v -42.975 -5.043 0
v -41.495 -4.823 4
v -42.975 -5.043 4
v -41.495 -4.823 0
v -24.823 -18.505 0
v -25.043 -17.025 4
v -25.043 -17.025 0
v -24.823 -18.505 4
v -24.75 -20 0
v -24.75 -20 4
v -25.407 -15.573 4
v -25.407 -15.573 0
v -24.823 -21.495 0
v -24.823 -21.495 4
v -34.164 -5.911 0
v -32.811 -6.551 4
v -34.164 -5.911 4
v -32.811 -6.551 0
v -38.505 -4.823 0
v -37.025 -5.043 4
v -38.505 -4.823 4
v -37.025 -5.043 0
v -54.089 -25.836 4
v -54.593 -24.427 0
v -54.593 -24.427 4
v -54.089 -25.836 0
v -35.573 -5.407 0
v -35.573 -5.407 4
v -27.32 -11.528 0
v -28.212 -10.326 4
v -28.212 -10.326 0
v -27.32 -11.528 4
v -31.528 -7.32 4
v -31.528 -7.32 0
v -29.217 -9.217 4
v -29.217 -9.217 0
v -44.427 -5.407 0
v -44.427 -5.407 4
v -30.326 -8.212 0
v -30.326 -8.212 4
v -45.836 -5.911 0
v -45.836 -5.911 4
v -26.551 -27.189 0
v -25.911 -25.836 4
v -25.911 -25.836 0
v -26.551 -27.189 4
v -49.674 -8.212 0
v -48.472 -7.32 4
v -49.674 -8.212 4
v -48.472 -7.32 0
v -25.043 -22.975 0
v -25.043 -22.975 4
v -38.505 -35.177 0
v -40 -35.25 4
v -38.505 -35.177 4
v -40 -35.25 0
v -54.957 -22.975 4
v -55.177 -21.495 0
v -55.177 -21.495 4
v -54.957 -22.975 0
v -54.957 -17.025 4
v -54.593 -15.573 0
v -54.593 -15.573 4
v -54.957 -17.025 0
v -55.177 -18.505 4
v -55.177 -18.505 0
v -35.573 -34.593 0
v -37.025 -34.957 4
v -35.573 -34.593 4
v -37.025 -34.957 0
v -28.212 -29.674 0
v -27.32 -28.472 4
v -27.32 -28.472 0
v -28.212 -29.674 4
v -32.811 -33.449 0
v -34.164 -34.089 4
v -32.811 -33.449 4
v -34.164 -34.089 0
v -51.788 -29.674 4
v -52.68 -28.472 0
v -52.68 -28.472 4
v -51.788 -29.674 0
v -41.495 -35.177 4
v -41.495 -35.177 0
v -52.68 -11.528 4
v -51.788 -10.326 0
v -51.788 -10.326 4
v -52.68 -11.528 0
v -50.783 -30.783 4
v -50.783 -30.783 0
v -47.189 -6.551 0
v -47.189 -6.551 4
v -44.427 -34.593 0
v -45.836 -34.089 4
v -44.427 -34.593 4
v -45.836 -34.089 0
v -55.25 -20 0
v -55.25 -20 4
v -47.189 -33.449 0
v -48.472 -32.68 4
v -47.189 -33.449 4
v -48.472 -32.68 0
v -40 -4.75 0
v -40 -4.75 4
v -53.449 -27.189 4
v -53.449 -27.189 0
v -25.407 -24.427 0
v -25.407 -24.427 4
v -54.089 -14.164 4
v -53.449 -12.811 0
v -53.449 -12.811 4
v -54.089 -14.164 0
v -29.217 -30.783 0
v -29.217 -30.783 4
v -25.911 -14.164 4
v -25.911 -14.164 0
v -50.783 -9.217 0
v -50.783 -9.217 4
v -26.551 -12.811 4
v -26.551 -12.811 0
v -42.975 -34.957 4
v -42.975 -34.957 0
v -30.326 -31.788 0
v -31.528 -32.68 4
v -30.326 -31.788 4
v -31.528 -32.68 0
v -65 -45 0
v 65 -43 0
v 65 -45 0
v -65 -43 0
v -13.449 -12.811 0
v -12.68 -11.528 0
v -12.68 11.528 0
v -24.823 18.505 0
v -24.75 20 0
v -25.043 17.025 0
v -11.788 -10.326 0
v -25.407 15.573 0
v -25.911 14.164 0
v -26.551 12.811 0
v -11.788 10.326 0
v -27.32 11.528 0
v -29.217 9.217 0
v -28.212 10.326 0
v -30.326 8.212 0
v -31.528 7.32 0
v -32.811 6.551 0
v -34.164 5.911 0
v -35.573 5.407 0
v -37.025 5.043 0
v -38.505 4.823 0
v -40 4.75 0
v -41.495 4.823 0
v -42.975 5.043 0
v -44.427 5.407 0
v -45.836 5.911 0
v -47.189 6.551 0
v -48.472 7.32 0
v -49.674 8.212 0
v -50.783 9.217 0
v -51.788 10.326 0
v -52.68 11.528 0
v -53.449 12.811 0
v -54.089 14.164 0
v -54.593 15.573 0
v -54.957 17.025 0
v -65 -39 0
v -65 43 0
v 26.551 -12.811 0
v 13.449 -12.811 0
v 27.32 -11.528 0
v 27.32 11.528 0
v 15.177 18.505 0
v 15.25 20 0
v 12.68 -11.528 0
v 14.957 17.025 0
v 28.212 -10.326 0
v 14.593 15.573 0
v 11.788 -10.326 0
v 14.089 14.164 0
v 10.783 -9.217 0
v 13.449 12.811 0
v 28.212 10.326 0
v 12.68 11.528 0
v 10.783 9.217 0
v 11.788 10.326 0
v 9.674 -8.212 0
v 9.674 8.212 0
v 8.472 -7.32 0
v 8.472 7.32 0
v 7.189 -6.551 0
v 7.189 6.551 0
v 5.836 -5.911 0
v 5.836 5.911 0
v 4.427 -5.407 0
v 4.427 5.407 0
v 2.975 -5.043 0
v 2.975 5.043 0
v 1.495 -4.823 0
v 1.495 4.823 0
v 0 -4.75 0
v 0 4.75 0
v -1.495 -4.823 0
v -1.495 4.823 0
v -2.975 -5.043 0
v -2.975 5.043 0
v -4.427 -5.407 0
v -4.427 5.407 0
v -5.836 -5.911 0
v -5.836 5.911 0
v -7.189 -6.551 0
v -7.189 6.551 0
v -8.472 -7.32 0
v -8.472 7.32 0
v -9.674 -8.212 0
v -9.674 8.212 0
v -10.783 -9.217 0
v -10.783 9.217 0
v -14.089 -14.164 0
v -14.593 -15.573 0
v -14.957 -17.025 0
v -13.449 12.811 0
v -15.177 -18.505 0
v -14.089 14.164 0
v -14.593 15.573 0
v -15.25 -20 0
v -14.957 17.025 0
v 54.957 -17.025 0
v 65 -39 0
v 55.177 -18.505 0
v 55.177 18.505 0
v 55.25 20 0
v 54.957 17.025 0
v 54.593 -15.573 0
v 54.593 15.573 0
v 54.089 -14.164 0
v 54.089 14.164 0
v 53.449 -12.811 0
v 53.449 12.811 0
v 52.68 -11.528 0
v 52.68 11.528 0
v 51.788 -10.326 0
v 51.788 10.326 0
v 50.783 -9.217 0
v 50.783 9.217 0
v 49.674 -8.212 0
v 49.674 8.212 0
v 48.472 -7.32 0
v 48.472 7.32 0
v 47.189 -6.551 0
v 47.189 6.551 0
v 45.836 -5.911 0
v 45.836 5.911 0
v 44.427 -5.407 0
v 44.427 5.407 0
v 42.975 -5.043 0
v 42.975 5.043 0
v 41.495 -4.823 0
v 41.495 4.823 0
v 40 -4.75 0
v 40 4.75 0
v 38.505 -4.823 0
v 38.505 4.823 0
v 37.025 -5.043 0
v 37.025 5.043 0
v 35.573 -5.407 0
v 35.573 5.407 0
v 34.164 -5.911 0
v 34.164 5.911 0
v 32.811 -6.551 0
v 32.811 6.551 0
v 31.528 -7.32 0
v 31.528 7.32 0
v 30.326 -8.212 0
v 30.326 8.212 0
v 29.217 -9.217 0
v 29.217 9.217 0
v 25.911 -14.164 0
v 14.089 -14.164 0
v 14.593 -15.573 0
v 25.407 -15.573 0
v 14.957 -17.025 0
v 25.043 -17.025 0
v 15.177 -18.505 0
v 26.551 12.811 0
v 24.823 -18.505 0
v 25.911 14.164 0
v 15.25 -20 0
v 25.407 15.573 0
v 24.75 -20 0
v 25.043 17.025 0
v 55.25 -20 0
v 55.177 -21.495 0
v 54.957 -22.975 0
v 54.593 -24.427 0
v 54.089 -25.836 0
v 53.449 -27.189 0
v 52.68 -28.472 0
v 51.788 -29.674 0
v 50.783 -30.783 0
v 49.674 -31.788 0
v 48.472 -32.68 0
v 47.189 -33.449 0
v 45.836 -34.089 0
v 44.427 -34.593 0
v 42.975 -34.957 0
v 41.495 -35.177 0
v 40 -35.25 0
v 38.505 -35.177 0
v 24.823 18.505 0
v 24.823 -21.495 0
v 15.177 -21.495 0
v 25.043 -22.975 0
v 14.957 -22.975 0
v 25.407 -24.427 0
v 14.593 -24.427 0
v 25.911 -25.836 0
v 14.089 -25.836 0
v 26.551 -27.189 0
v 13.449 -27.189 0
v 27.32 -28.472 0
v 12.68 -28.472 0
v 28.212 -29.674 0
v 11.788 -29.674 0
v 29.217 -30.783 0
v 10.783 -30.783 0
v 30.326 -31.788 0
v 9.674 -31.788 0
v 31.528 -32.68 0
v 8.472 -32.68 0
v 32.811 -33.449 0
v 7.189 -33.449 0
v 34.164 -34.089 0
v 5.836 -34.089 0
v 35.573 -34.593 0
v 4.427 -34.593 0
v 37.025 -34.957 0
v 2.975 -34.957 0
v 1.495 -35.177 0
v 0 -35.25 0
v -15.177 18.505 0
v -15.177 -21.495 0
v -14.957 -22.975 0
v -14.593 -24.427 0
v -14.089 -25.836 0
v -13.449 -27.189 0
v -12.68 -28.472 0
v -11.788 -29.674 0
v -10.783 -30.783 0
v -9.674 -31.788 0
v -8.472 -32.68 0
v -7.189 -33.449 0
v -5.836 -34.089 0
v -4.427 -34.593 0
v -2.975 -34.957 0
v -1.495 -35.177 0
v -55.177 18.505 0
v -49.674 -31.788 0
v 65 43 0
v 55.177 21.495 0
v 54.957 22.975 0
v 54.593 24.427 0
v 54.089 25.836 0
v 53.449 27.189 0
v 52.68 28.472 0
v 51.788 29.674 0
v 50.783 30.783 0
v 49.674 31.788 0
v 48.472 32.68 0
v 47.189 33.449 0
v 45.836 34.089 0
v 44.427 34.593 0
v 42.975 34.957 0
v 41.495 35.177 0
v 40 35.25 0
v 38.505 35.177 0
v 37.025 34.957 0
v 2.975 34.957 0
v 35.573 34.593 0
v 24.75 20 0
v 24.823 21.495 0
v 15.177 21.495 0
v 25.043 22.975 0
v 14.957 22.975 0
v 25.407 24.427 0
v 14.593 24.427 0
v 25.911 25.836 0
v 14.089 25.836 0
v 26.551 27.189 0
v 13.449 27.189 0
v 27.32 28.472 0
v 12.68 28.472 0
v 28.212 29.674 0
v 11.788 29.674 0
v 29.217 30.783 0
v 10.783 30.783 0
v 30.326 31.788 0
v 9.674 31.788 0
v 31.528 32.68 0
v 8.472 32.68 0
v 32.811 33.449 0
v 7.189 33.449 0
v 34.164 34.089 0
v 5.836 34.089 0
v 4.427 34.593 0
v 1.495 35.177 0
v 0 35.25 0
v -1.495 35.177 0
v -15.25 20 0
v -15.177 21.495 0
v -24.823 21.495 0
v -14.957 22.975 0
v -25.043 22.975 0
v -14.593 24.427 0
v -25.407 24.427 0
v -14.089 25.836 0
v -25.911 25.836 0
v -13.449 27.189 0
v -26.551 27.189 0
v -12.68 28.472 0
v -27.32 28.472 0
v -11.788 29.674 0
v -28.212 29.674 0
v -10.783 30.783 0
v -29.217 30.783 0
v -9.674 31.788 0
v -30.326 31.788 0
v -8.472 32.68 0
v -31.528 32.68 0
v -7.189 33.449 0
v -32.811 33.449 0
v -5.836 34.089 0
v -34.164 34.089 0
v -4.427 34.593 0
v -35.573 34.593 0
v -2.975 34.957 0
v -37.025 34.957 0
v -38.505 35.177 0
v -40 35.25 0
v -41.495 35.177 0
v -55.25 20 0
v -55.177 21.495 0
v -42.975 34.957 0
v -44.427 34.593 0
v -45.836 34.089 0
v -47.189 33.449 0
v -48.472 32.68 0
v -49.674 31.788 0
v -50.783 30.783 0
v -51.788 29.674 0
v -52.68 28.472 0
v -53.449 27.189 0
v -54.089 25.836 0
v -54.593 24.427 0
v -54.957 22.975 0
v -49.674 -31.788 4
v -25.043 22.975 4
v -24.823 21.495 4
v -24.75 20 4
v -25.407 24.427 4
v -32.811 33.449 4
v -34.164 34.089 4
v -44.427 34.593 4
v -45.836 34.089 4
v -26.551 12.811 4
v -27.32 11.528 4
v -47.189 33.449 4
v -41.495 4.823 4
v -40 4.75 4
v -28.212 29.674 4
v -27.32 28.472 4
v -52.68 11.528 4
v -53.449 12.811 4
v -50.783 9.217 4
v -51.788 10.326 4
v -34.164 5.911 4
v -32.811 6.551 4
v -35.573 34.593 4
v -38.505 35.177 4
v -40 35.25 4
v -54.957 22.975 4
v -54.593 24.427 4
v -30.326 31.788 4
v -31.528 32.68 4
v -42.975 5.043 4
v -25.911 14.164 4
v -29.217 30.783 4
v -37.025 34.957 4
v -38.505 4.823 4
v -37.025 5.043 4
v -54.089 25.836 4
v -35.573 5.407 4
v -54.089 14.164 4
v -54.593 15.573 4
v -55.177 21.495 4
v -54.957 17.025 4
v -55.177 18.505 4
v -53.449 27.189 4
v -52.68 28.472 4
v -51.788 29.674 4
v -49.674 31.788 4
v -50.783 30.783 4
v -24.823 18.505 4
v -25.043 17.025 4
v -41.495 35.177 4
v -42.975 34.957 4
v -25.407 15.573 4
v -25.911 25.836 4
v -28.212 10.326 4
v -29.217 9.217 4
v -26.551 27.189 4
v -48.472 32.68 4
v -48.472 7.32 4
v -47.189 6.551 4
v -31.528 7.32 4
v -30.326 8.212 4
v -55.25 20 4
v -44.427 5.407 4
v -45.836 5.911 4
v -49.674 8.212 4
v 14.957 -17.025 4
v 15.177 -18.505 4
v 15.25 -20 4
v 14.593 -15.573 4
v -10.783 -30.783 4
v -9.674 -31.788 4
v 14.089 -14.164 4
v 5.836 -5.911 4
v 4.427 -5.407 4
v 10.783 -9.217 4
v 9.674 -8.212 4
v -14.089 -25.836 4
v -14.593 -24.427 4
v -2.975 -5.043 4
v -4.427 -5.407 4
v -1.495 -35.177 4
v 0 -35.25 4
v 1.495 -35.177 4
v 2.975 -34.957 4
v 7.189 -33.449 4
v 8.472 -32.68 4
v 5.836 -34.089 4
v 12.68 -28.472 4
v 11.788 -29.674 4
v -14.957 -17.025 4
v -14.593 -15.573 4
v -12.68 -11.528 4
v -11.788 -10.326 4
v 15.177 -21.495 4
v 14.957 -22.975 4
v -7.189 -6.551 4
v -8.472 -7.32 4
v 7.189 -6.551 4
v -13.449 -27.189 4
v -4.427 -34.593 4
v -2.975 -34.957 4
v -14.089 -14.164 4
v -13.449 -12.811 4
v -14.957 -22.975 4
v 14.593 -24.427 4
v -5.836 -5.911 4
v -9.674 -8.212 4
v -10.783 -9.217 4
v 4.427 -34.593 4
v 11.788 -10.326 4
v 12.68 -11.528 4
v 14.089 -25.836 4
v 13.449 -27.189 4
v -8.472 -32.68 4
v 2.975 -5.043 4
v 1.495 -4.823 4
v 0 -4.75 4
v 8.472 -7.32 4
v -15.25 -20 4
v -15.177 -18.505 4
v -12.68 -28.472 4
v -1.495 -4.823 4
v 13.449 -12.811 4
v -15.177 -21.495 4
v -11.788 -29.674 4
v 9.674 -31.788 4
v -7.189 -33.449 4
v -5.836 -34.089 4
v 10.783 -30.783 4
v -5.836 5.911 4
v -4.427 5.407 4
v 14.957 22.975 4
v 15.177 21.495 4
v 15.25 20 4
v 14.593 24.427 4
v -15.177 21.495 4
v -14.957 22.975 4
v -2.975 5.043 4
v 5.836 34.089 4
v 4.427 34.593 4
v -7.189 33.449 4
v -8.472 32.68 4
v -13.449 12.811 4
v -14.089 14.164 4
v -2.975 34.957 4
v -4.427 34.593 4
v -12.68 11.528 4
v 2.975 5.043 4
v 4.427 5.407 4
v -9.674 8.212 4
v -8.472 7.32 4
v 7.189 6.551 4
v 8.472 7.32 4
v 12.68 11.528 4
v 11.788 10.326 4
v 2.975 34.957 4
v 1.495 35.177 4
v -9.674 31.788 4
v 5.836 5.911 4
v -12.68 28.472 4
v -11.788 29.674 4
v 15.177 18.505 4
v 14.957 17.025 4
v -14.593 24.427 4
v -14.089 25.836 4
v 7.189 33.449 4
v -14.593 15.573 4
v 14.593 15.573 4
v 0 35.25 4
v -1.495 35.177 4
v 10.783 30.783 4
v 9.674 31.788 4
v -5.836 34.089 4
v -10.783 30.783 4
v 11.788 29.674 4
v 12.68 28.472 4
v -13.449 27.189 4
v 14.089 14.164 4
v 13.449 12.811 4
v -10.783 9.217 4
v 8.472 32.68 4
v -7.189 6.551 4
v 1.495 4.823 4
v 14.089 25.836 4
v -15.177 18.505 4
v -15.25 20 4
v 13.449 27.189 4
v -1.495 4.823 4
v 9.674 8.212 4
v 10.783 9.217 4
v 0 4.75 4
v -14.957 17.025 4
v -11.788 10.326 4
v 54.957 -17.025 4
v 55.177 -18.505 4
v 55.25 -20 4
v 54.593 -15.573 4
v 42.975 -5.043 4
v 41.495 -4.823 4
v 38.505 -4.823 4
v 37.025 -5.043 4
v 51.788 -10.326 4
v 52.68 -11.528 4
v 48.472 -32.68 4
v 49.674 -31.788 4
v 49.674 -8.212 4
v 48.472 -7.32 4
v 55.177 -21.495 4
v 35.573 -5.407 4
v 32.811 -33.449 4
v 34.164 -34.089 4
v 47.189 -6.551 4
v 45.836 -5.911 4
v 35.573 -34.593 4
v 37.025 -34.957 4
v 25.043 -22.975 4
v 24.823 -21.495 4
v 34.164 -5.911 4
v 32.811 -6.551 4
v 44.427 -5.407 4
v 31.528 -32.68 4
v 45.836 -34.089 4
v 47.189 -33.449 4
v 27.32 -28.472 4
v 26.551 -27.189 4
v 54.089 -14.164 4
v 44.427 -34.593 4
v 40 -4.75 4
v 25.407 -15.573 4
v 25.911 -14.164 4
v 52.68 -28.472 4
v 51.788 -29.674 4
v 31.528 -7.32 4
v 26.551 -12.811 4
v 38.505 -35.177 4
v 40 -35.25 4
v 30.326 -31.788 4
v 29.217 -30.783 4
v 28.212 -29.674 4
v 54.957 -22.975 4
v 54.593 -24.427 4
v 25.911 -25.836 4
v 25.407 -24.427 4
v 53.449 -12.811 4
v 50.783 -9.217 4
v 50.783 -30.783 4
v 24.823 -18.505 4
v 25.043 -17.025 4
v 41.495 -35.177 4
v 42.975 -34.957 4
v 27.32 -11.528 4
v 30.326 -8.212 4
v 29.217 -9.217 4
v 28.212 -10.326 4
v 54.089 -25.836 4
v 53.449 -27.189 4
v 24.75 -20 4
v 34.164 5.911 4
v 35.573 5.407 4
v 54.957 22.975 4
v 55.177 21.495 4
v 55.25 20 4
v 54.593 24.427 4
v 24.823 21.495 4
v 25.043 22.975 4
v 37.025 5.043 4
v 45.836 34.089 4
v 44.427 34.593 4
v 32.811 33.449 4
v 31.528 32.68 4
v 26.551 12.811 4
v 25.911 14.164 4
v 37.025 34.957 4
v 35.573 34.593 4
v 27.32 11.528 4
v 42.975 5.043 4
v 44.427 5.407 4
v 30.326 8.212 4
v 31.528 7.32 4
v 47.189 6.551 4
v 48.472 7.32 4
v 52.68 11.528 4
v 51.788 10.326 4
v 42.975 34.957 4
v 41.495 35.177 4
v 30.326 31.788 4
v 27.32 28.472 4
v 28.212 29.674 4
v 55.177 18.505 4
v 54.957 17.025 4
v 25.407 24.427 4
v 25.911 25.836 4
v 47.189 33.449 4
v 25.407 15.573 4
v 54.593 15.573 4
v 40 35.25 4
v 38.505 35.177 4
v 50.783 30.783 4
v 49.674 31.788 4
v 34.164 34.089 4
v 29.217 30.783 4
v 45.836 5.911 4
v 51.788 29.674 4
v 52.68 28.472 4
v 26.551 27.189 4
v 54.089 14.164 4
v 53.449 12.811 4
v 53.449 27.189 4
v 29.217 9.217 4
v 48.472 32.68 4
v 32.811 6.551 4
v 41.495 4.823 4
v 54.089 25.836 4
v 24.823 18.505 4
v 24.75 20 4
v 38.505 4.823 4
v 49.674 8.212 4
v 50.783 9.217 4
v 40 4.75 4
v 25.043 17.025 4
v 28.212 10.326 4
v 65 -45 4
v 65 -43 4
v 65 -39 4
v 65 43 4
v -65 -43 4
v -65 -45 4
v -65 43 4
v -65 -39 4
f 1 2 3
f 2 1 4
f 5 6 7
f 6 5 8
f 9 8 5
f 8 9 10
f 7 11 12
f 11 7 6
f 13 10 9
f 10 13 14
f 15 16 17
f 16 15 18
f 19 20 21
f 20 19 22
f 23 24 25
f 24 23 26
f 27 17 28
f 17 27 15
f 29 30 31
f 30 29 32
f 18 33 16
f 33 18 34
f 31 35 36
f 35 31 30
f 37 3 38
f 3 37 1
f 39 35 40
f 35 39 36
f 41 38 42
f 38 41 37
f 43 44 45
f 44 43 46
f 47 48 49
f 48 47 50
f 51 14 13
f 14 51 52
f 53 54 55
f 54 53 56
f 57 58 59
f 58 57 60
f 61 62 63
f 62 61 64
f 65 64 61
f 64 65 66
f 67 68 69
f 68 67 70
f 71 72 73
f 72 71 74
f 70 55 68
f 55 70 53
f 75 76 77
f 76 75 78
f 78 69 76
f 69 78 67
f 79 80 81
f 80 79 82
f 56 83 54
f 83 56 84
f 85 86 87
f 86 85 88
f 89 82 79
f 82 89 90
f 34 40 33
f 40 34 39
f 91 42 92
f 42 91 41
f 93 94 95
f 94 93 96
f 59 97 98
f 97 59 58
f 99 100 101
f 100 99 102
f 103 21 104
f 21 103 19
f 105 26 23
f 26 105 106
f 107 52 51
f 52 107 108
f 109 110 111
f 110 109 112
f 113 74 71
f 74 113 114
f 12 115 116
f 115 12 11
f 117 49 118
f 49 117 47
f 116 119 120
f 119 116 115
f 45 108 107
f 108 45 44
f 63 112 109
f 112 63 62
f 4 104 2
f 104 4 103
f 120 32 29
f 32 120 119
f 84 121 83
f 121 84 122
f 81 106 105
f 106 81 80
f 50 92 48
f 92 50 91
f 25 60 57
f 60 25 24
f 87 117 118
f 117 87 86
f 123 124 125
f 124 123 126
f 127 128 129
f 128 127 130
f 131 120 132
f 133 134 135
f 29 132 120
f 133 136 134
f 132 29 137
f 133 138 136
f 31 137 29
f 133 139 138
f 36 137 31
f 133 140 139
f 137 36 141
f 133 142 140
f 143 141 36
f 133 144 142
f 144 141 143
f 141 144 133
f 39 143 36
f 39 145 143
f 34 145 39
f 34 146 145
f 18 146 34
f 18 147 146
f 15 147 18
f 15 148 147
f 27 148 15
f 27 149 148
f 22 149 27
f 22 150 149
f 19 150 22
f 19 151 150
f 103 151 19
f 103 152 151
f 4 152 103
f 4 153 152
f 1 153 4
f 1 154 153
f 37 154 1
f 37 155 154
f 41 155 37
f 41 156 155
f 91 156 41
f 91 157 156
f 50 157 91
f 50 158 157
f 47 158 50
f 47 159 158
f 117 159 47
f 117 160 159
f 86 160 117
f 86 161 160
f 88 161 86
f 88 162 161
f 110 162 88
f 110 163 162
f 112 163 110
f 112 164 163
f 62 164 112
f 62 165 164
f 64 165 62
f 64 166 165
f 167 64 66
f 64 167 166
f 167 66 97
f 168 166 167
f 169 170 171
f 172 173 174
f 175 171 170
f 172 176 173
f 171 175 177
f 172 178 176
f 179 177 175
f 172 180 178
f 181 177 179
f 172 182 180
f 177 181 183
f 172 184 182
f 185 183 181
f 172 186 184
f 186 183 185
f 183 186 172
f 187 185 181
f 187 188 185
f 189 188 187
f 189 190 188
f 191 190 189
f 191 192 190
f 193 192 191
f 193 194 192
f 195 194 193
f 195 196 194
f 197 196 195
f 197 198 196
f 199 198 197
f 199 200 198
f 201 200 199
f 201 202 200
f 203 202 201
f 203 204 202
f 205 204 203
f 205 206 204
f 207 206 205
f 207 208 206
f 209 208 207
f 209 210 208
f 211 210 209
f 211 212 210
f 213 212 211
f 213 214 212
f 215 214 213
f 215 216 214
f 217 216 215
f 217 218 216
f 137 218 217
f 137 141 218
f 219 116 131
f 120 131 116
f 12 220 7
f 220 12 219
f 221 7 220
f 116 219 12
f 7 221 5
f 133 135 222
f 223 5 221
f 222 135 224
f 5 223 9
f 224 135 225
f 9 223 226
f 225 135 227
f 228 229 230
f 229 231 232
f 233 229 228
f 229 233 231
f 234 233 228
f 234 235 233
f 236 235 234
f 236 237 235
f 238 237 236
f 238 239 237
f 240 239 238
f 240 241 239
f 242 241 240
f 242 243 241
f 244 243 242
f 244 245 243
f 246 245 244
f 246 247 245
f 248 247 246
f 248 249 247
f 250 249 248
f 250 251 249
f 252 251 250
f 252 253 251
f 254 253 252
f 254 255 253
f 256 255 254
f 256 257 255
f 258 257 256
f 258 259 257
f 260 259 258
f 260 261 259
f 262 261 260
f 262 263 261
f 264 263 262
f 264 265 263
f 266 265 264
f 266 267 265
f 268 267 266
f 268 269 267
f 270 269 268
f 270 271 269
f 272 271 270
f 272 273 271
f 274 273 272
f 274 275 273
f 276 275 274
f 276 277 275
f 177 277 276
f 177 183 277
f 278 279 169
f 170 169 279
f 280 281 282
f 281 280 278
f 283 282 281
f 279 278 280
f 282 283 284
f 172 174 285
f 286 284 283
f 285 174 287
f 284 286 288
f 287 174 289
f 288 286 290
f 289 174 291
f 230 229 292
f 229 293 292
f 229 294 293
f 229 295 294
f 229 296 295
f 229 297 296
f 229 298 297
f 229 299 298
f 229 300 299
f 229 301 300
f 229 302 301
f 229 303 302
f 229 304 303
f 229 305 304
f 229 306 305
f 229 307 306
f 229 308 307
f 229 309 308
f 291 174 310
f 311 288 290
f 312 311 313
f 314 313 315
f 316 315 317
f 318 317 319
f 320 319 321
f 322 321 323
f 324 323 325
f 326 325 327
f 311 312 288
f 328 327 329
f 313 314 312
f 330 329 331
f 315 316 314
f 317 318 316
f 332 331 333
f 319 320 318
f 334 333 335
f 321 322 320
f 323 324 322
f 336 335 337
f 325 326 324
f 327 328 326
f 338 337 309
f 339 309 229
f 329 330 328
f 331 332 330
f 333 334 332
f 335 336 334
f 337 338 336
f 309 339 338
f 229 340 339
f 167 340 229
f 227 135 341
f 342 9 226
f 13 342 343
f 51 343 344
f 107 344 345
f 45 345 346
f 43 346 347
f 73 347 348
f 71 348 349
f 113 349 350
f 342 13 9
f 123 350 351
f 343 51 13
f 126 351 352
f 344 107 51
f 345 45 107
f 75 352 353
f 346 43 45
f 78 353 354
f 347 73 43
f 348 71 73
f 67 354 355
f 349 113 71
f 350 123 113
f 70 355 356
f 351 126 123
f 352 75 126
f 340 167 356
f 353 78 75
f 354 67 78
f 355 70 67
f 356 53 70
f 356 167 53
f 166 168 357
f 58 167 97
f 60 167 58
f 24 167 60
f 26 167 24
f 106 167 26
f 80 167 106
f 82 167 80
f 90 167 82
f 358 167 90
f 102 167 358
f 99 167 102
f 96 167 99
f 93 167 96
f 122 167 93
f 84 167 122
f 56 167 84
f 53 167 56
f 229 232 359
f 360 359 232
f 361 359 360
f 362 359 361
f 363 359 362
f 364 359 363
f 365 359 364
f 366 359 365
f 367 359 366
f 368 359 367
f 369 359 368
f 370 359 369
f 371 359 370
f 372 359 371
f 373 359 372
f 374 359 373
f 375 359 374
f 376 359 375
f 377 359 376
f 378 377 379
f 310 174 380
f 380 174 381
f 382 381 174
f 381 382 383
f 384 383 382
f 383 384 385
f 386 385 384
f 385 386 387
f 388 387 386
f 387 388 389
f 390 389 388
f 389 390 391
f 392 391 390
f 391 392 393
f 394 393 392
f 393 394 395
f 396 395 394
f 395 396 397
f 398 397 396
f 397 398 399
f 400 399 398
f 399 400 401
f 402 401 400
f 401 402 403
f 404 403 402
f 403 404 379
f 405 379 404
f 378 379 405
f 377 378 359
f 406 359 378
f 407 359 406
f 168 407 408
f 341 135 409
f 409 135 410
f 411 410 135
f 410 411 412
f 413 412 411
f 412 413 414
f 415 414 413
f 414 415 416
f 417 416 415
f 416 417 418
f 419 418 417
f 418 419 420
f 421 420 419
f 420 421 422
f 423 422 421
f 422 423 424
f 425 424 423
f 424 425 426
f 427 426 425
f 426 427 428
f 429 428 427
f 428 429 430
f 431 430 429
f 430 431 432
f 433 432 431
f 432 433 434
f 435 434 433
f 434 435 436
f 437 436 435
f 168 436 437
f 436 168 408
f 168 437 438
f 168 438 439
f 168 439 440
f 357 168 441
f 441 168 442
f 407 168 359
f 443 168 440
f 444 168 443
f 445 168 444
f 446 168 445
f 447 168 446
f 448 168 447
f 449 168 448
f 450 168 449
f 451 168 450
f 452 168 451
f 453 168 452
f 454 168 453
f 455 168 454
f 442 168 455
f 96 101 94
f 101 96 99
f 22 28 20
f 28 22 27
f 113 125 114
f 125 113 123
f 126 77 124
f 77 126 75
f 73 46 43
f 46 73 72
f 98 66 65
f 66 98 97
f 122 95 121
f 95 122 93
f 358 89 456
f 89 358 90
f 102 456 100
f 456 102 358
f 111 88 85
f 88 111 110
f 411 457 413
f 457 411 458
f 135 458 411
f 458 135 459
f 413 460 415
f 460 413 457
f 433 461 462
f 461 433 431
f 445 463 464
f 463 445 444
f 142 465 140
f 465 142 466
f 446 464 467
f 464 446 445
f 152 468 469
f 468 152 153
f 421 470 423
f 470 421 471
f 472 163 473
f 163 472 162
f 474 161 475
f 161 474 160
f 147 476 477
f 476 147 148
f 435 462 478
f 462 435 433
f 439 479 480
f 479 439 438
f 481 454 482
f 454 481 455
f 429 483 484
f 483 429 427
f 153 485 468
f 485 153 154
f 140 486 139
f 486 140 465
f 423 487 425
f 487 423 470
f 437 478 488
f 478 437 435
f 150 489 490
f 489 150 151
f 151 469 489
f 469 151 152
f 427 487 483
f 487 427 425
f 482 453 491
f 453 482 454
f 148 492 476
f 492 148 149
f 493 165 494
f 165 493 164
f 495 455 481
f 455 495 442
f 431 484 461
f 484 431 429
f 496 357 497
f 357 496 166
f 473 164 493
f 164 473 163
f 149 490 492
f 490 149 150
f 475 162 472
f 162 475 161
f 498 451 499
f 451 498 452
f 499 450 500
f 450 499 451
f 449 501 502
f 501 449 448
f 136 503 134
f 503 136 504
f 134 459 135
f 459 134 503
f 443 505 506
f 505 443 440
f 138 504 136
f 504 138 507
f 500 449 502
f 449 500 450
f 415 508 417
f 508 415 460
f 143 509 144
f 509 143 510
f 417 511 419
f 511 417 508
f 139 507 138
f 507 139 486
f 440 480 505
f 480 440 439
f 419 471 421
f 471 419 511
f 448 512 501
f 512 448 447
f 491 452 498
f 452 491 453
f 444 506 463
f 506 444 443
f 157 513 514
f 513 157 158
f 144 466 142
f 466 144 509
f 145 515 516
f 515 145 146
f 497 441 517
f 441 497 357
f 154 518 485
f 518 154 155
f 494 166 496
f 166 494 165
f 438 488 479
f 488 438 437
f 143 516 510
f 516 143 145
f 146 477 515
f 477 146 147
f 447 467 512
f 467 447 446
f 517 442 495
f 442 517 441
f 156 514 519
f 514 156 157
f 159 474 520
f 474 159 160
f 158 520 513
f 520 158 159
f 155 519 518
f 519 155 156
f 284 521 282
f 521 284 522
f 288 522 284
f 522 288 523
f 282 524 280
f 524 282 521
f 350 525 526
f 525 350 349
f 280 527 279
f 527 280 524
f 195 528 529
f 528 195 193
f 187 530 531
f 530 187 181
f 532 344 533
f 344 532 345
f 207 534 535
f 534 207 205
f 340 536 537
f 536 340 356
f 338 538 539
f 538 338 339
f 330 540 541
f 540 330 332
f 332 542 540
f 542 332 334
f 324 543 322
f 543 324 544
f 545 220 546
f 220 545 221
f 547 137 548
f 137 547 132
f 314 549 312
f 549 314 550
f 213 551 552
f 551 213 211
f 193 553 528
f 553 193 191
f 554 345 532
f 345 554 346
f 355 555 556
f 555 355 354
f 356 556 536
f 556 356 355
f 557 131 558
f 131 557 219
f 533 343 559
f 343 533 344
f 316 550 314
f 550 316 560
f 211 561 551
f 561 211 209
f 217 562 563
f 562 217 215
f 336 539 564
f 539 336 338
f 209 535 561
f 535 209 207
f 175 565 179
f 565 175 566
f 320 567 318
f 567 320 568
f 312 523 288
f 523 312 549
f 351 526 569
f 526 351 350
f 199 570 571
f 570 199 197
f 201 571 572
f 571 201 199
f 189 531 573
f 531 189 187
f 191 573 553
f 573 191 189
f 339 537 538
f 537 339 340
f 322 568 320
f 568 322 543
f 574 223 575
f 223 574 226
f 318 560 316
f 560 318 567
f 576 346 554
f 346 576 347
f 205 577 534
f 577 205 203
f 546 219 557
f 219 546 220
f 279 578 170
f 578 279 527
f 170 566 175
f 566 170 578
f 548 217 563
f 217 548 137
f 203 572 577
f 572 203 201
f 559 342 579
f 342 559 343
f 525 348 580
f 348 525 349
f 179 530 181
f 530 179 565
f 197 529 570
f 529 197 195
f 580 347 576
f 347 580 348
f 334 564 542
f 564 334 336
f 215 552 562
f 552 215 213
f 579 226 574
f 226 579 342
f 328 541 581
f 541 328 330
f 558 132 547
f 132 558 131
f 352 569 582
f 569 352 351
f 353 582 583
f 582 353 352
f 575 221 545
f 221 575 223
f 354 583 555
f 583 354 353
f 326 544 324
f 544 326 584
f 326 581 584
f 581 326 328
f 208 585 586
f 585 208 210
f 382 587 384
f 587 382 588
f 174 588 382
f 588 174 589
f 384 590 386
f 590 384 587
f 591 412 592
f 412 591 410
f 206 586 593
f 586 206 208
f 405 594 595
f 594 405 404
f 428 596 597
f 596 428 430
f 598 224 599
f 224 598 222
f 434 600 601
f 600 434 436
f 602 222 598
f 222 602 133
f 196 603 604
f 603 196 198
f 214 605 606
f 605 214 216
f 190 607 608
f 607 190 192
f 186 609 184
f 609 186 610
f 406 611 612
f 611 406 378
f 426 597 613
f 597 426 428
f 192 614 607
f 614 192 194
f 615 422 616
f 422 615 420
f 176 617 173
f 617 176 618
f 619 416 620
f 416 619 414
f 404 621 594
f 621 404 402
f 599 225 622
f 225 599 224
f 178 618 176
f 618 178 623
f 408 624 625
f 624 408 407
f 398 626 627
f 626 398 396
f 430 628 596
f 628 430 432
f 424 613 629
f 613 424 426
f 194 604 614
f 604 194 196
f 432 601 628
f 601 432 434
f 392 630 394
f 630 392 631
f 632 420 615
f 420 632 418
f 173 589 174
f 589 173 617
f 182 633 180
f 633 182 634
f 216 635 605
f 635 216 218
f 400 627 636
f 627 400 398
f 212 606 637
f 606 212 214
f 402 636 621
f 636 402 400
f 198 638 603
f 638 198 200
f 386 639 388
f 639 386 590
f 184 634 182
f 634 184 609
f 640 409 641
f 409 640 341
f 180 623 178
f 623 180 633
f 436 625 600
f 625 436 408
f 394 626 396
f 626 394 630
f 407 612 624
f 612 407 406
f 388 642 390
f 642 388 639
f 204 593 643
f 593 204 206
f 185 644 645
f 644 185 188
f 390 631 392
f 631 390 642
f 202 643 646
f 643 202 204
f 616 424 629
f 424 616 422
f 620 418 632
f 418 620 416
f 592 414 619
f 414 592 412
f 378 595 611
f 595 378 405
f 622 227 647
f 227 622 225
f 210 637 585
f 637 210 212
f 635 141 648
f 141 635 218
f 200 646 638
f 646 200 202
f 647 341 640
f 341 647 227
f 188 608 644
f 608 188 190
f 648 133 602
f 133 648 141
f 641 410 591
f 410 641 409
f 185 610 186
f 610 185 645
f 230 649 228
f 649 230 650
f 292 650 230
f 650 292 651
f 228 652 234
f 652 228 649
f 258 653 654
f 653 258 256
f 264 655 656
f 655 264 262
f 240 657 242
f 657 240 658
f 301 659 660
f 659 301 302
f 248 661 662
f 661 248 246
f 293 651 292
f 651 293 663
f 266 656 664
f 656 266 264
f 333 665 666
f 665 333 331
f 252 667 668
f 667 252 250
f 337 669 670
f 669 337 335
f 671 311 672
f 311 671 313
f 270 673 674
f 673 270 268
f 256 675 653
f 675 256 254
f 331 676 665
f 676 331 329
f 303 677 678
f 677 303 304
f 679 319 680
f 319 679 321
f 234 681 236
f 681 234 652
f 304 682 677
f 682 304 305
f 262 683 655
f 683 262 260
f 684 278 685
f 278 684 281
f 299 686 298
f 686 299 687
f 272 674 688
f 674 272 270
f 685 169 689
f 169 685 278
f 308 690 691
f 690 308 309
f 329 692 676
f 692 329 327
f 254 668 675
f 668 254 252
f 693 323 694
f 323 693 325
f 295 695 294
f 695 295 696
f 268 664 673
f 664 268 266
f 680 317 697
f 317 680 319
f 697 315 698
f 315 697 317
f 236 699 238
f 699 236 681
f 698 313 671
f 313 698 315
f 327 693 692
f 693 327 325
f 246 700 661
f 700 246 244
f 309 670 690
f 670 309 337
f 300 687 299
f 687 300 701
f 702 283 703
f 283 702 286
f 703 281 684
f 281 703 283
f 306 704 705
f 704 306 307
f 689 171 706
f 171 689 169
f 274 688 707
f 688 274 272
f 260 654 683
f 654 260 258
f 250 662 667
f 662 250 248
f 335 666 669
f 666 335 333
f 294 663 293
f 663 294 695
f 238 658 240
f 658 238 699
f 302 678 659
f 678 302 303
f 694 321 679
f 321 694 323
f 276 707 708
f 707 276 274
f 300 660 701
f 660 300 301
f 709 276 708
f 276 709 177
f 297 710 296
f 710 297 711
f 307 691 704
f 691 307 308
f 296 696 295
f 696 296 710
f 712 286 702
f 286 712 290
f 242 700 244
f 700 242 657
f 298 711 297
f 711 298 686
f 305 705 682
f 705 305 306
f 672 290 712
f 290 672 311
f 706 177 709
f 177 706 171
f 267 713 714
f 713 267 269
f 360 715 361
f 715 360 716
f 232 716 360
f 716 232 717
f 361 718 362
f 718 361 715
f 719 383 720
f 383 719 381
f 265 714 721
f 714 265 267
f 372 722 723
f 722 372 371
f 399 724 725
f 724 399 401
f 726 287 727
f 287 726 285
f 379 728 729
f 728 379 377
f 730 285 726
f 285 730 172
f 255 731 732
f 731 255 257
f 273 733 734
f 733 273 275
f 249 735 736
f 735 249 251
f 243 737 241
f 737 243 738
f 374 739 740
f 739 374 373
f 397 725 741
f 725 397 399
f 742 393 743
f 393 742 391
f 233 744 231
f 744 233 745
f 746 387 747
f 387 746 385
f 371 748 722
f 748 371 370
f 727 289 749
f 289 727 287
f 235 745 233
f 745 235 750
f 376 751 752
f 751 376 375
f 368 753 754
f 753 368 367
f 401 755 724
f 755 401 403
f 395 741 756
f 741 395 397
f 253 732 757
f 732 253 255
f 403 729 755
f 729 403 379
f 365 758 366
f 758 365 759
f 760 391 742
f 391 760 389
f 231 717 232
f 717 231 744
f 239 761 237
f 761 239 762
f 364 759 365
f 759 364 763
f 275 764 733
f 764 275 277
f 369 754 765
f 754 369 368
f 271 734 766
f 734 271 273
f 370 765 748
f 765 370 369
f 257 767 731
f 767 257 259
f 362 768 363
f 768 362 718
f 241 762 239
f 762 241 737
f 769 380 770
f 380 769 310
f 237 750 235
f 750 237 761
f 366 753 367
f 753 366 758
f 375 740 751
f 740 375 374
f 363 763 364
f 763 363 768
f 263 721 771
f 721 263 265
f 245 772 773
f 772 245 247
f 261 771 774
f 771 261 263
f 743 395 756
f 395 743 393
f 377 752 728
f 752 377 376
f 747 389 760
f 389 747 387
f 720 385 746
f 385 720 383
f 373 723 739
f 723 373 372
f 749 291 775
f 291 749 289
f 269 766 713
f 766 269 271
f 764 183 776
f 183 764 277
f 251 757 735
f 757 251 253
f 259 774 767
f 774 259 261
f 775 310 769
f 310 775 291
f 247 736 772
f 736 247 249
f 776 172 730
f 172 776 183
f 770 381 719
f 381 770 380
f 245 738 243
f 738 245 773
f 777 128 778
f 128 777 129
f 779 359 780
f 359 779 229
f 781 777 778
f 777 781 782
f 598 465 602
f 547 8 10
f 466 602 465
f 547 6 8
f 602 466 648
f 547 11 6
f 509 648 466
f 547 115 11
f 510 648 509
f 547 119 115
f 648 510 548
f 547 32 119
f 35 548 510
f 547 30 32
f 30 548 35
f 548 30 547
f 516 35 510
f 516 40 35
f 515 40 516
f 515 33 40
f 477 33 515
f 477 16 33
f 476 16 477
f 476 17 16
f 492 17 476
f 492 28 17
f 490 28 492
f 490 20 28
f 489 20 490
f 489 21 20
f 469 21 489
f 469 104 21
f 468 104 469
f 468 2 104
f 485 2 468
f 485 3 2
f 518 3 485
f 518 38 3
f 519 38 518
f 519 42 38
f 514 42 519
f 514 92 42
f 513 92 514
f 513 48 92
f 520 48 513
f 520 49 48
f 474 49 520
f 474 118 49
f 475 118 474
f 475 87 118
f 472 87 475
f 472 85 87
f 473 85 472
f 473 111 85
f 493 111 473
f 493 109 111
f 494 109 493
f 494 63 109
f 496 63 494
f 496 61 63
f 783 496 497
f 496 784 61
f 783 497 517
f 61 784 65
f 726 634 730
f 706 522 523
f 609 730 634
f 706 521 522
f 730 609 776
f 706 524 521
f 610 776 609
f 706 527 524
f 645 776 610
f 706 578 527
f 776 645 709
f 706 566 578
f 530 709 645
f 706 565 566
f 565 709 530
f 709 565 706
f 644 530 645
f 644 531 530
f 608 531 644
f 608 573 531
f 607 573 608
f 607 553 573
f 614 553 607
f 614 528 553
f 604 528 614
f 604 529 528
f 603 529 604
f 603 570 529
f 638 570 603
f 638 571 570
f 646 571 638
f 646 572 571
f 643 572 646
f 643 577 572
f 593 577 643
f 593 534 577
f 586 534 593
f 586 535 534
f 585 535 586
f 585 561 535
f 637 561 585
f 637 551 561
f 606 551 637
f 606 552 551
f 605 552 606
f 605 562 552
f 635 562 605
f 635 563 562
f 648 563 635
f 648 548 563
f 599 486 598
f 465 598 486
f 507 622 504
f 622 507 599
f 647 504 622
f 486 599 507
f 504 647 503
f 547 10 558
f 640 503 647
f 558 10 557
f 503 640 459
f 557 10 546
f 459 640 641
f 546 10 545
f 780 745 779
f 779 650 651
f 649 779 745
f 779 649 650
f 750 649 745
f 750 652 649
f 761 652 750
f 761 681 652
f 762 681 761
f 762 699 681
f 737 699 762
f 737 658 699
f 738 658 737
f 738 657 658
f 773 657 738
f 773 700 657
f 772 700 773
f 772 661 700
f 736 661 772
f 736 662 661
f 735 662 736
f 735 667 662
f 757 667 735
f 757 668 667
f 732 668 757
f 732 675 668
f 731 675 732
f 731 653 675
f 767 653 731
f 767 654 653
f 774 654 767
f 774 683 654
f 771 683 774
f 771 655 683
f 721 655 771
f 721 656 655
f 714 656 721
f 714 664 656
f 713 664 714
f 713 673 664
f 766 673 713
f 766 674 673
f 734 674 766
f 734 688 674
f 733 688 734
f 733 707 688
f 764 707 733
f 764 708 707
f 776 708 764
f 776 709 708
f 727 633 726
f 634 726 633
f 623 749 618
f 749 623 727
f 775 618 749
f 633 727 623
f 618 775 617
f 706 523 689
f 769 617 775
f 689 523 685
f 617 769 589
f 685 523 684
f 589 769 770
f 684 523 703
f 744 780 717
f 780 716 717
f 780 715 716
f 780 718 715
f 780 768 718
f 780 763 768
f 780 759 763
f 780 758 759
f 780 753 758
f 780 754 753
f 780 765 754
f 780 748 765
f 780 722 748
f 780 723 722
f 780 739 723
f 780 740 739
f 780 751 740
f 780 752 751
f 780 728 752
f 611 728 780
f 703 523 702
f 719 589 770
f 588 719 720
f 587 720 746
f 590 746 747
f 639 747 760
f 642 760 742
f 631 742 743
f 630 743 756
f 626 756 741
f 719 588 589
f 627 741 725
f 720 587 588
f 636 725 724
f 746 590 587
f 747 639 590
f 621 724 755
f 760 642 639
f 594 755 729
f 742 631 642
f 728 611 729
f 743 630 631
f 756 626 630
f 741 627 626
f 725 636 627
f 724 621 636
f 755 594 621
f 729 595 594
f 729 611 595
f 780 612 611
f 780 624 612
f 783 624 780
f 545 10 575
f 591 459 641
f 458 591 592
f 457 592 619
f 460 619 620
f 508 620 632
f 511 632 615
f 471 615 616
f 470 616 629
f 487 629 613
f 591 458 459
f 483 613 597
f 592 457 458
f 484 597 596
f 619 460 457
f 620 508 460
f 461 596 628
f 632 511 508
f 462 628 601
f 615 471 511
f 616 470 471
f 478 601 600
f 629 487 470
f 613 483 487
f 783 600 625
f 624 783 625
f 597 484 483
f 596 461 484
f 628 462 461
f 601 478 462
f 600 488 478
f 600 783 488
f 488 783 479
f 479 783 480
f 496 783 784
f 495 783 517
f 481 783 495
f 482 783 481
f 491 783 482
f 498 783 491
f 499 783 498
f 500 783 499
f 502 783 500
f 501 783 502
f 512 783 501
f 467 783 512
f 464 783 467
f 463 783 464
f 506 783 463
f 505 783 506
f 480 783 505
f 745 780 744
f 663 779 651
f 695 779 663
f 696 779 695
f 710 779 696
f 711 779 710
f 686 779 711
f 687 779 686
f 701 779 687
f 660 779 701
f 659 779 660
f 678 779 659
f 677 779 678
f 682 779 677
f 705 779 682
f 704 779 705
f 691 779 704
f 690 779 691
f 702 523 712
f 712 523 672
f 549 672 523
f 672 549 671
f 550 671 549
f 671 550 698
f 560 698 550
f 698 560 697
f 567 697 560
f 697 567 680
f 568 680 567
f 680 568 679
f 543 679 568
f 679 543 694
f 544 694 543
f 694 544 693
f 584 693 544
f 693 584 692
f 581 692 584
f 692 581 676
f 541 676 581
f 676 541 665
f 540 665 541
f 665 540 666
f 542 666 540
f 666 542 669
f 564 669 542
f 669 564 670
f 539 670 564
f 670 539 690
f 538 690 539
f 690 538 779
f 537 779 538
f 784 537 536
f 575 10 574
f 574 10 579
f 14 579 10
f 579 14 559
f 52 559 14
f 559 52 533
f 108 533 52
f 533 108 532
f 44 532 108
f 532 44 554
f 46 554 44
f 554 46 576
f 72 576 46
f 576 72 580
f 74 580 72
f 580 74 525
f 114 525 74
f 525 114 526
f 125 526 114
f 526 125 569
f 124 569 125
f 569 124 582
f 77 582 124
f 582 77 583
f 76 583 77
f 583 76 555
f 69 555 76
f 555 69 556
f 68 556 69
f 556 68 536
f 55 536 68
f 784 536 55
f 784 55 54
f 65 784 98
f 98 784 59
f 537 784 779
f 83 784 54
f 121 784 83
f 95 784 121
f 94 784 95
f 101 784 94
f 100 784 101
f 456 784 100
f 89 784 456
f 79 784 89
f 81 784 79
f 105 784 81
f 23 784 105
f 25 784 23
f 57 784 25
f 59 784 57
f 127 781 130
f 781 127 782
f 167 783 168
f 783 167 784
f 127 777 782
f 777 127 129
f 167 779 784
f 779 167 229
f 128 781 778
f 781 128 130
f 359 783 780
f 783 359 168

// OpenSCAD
// Rack for six 50 mL conical (Falcon-type) tubes.
// Print orientation: Flat plate on bed (z=0), walls rising to z=70.
// After printing, flip over so walls stand on the bed and tubes hang down.

// Plate dimensions
L     = 130; // Length (X)
W     = 90;  // Width (Y)
t_plate = 4; // Plate thickness (Z)

// Hole specifications
n_rows = 2; // Rows along Y
n_cols = 3; // Columns along X
hole_d = 30.5; // Hole diameter
pitch_x = 40; // Centre-to-centre spacing X
pitch_y = 40; // Centre-to-centre spacing Y

// Wall specifications
wall_h = 70; // Wall height (from plate top)
wall_t = 4;  // Wall thickness (Y)

// Derived positions (centred on origin)
// X positions: -65, -20, 20, 65 (Wait, 3 holes with 40mm pitch centred)
// Let's calculate X positions for 3 holes:
// Indices: 0, 1, 2. Centre index is 1.
// Pos = (i - (n_cols-1)/2) * pitch_x
// i=0: (0 - 1) * 40 = -40
// i=1: (1 - 1) * 40 = 0
// i=2: (2 - 1) * 40 = 40
// Total span = 80mm. Plate is 130mm. Margins = (130-80)/2 = 25mm. Correct.

// Y positions: -40, 40 (2 holes with 40mm pitch centred)
// i=0: (0 - 0.5) * 40 = -20
// i=1: (1 - 0.5) * 40 = 20
// Total span = 40mm. Plate is 90mm. Margins = (90-40)/2 = 25mm. Correct.

// Generate hole coordinates
hole_x = [for (i = [0 : n_cols - 1]) (i - (n_cols - 1) / 2) * pitch_x];
hole_y = [for (i = [0 : n_rows - 1]) (i - (n_rows - 1) / 2) * pitch_y];

$fn = 64;

difference() {
    // 1. The main flat plate
    translate([-L / 2, -W / 2, 0]) 
        cube([L, W, t_plate]);

    // 2. The two long side walls
    // Left wall (at Y = -W/2 + wall_t/2)
    translate([-L / 2, -W / 2 + wall_t / 2, 0]) 
        cube([L, wall_t, wall_h]);
    
    // Right wall (at Y = W/2 - wall_t/2)
    translate([-L / 2, W / 2 - wall_t / 2, 0]) 
        cube([L, wall_t, wall_h]);

    // 3. The through-holes
    for (x = hole_x) {
        for (y = hole_y) {
            translate([x, y, 0]) 
                cylinder(h = t_plate + wall_h + 2, d = hole_d); // Extend past walls to ensure clean cut
        }
    }
}
